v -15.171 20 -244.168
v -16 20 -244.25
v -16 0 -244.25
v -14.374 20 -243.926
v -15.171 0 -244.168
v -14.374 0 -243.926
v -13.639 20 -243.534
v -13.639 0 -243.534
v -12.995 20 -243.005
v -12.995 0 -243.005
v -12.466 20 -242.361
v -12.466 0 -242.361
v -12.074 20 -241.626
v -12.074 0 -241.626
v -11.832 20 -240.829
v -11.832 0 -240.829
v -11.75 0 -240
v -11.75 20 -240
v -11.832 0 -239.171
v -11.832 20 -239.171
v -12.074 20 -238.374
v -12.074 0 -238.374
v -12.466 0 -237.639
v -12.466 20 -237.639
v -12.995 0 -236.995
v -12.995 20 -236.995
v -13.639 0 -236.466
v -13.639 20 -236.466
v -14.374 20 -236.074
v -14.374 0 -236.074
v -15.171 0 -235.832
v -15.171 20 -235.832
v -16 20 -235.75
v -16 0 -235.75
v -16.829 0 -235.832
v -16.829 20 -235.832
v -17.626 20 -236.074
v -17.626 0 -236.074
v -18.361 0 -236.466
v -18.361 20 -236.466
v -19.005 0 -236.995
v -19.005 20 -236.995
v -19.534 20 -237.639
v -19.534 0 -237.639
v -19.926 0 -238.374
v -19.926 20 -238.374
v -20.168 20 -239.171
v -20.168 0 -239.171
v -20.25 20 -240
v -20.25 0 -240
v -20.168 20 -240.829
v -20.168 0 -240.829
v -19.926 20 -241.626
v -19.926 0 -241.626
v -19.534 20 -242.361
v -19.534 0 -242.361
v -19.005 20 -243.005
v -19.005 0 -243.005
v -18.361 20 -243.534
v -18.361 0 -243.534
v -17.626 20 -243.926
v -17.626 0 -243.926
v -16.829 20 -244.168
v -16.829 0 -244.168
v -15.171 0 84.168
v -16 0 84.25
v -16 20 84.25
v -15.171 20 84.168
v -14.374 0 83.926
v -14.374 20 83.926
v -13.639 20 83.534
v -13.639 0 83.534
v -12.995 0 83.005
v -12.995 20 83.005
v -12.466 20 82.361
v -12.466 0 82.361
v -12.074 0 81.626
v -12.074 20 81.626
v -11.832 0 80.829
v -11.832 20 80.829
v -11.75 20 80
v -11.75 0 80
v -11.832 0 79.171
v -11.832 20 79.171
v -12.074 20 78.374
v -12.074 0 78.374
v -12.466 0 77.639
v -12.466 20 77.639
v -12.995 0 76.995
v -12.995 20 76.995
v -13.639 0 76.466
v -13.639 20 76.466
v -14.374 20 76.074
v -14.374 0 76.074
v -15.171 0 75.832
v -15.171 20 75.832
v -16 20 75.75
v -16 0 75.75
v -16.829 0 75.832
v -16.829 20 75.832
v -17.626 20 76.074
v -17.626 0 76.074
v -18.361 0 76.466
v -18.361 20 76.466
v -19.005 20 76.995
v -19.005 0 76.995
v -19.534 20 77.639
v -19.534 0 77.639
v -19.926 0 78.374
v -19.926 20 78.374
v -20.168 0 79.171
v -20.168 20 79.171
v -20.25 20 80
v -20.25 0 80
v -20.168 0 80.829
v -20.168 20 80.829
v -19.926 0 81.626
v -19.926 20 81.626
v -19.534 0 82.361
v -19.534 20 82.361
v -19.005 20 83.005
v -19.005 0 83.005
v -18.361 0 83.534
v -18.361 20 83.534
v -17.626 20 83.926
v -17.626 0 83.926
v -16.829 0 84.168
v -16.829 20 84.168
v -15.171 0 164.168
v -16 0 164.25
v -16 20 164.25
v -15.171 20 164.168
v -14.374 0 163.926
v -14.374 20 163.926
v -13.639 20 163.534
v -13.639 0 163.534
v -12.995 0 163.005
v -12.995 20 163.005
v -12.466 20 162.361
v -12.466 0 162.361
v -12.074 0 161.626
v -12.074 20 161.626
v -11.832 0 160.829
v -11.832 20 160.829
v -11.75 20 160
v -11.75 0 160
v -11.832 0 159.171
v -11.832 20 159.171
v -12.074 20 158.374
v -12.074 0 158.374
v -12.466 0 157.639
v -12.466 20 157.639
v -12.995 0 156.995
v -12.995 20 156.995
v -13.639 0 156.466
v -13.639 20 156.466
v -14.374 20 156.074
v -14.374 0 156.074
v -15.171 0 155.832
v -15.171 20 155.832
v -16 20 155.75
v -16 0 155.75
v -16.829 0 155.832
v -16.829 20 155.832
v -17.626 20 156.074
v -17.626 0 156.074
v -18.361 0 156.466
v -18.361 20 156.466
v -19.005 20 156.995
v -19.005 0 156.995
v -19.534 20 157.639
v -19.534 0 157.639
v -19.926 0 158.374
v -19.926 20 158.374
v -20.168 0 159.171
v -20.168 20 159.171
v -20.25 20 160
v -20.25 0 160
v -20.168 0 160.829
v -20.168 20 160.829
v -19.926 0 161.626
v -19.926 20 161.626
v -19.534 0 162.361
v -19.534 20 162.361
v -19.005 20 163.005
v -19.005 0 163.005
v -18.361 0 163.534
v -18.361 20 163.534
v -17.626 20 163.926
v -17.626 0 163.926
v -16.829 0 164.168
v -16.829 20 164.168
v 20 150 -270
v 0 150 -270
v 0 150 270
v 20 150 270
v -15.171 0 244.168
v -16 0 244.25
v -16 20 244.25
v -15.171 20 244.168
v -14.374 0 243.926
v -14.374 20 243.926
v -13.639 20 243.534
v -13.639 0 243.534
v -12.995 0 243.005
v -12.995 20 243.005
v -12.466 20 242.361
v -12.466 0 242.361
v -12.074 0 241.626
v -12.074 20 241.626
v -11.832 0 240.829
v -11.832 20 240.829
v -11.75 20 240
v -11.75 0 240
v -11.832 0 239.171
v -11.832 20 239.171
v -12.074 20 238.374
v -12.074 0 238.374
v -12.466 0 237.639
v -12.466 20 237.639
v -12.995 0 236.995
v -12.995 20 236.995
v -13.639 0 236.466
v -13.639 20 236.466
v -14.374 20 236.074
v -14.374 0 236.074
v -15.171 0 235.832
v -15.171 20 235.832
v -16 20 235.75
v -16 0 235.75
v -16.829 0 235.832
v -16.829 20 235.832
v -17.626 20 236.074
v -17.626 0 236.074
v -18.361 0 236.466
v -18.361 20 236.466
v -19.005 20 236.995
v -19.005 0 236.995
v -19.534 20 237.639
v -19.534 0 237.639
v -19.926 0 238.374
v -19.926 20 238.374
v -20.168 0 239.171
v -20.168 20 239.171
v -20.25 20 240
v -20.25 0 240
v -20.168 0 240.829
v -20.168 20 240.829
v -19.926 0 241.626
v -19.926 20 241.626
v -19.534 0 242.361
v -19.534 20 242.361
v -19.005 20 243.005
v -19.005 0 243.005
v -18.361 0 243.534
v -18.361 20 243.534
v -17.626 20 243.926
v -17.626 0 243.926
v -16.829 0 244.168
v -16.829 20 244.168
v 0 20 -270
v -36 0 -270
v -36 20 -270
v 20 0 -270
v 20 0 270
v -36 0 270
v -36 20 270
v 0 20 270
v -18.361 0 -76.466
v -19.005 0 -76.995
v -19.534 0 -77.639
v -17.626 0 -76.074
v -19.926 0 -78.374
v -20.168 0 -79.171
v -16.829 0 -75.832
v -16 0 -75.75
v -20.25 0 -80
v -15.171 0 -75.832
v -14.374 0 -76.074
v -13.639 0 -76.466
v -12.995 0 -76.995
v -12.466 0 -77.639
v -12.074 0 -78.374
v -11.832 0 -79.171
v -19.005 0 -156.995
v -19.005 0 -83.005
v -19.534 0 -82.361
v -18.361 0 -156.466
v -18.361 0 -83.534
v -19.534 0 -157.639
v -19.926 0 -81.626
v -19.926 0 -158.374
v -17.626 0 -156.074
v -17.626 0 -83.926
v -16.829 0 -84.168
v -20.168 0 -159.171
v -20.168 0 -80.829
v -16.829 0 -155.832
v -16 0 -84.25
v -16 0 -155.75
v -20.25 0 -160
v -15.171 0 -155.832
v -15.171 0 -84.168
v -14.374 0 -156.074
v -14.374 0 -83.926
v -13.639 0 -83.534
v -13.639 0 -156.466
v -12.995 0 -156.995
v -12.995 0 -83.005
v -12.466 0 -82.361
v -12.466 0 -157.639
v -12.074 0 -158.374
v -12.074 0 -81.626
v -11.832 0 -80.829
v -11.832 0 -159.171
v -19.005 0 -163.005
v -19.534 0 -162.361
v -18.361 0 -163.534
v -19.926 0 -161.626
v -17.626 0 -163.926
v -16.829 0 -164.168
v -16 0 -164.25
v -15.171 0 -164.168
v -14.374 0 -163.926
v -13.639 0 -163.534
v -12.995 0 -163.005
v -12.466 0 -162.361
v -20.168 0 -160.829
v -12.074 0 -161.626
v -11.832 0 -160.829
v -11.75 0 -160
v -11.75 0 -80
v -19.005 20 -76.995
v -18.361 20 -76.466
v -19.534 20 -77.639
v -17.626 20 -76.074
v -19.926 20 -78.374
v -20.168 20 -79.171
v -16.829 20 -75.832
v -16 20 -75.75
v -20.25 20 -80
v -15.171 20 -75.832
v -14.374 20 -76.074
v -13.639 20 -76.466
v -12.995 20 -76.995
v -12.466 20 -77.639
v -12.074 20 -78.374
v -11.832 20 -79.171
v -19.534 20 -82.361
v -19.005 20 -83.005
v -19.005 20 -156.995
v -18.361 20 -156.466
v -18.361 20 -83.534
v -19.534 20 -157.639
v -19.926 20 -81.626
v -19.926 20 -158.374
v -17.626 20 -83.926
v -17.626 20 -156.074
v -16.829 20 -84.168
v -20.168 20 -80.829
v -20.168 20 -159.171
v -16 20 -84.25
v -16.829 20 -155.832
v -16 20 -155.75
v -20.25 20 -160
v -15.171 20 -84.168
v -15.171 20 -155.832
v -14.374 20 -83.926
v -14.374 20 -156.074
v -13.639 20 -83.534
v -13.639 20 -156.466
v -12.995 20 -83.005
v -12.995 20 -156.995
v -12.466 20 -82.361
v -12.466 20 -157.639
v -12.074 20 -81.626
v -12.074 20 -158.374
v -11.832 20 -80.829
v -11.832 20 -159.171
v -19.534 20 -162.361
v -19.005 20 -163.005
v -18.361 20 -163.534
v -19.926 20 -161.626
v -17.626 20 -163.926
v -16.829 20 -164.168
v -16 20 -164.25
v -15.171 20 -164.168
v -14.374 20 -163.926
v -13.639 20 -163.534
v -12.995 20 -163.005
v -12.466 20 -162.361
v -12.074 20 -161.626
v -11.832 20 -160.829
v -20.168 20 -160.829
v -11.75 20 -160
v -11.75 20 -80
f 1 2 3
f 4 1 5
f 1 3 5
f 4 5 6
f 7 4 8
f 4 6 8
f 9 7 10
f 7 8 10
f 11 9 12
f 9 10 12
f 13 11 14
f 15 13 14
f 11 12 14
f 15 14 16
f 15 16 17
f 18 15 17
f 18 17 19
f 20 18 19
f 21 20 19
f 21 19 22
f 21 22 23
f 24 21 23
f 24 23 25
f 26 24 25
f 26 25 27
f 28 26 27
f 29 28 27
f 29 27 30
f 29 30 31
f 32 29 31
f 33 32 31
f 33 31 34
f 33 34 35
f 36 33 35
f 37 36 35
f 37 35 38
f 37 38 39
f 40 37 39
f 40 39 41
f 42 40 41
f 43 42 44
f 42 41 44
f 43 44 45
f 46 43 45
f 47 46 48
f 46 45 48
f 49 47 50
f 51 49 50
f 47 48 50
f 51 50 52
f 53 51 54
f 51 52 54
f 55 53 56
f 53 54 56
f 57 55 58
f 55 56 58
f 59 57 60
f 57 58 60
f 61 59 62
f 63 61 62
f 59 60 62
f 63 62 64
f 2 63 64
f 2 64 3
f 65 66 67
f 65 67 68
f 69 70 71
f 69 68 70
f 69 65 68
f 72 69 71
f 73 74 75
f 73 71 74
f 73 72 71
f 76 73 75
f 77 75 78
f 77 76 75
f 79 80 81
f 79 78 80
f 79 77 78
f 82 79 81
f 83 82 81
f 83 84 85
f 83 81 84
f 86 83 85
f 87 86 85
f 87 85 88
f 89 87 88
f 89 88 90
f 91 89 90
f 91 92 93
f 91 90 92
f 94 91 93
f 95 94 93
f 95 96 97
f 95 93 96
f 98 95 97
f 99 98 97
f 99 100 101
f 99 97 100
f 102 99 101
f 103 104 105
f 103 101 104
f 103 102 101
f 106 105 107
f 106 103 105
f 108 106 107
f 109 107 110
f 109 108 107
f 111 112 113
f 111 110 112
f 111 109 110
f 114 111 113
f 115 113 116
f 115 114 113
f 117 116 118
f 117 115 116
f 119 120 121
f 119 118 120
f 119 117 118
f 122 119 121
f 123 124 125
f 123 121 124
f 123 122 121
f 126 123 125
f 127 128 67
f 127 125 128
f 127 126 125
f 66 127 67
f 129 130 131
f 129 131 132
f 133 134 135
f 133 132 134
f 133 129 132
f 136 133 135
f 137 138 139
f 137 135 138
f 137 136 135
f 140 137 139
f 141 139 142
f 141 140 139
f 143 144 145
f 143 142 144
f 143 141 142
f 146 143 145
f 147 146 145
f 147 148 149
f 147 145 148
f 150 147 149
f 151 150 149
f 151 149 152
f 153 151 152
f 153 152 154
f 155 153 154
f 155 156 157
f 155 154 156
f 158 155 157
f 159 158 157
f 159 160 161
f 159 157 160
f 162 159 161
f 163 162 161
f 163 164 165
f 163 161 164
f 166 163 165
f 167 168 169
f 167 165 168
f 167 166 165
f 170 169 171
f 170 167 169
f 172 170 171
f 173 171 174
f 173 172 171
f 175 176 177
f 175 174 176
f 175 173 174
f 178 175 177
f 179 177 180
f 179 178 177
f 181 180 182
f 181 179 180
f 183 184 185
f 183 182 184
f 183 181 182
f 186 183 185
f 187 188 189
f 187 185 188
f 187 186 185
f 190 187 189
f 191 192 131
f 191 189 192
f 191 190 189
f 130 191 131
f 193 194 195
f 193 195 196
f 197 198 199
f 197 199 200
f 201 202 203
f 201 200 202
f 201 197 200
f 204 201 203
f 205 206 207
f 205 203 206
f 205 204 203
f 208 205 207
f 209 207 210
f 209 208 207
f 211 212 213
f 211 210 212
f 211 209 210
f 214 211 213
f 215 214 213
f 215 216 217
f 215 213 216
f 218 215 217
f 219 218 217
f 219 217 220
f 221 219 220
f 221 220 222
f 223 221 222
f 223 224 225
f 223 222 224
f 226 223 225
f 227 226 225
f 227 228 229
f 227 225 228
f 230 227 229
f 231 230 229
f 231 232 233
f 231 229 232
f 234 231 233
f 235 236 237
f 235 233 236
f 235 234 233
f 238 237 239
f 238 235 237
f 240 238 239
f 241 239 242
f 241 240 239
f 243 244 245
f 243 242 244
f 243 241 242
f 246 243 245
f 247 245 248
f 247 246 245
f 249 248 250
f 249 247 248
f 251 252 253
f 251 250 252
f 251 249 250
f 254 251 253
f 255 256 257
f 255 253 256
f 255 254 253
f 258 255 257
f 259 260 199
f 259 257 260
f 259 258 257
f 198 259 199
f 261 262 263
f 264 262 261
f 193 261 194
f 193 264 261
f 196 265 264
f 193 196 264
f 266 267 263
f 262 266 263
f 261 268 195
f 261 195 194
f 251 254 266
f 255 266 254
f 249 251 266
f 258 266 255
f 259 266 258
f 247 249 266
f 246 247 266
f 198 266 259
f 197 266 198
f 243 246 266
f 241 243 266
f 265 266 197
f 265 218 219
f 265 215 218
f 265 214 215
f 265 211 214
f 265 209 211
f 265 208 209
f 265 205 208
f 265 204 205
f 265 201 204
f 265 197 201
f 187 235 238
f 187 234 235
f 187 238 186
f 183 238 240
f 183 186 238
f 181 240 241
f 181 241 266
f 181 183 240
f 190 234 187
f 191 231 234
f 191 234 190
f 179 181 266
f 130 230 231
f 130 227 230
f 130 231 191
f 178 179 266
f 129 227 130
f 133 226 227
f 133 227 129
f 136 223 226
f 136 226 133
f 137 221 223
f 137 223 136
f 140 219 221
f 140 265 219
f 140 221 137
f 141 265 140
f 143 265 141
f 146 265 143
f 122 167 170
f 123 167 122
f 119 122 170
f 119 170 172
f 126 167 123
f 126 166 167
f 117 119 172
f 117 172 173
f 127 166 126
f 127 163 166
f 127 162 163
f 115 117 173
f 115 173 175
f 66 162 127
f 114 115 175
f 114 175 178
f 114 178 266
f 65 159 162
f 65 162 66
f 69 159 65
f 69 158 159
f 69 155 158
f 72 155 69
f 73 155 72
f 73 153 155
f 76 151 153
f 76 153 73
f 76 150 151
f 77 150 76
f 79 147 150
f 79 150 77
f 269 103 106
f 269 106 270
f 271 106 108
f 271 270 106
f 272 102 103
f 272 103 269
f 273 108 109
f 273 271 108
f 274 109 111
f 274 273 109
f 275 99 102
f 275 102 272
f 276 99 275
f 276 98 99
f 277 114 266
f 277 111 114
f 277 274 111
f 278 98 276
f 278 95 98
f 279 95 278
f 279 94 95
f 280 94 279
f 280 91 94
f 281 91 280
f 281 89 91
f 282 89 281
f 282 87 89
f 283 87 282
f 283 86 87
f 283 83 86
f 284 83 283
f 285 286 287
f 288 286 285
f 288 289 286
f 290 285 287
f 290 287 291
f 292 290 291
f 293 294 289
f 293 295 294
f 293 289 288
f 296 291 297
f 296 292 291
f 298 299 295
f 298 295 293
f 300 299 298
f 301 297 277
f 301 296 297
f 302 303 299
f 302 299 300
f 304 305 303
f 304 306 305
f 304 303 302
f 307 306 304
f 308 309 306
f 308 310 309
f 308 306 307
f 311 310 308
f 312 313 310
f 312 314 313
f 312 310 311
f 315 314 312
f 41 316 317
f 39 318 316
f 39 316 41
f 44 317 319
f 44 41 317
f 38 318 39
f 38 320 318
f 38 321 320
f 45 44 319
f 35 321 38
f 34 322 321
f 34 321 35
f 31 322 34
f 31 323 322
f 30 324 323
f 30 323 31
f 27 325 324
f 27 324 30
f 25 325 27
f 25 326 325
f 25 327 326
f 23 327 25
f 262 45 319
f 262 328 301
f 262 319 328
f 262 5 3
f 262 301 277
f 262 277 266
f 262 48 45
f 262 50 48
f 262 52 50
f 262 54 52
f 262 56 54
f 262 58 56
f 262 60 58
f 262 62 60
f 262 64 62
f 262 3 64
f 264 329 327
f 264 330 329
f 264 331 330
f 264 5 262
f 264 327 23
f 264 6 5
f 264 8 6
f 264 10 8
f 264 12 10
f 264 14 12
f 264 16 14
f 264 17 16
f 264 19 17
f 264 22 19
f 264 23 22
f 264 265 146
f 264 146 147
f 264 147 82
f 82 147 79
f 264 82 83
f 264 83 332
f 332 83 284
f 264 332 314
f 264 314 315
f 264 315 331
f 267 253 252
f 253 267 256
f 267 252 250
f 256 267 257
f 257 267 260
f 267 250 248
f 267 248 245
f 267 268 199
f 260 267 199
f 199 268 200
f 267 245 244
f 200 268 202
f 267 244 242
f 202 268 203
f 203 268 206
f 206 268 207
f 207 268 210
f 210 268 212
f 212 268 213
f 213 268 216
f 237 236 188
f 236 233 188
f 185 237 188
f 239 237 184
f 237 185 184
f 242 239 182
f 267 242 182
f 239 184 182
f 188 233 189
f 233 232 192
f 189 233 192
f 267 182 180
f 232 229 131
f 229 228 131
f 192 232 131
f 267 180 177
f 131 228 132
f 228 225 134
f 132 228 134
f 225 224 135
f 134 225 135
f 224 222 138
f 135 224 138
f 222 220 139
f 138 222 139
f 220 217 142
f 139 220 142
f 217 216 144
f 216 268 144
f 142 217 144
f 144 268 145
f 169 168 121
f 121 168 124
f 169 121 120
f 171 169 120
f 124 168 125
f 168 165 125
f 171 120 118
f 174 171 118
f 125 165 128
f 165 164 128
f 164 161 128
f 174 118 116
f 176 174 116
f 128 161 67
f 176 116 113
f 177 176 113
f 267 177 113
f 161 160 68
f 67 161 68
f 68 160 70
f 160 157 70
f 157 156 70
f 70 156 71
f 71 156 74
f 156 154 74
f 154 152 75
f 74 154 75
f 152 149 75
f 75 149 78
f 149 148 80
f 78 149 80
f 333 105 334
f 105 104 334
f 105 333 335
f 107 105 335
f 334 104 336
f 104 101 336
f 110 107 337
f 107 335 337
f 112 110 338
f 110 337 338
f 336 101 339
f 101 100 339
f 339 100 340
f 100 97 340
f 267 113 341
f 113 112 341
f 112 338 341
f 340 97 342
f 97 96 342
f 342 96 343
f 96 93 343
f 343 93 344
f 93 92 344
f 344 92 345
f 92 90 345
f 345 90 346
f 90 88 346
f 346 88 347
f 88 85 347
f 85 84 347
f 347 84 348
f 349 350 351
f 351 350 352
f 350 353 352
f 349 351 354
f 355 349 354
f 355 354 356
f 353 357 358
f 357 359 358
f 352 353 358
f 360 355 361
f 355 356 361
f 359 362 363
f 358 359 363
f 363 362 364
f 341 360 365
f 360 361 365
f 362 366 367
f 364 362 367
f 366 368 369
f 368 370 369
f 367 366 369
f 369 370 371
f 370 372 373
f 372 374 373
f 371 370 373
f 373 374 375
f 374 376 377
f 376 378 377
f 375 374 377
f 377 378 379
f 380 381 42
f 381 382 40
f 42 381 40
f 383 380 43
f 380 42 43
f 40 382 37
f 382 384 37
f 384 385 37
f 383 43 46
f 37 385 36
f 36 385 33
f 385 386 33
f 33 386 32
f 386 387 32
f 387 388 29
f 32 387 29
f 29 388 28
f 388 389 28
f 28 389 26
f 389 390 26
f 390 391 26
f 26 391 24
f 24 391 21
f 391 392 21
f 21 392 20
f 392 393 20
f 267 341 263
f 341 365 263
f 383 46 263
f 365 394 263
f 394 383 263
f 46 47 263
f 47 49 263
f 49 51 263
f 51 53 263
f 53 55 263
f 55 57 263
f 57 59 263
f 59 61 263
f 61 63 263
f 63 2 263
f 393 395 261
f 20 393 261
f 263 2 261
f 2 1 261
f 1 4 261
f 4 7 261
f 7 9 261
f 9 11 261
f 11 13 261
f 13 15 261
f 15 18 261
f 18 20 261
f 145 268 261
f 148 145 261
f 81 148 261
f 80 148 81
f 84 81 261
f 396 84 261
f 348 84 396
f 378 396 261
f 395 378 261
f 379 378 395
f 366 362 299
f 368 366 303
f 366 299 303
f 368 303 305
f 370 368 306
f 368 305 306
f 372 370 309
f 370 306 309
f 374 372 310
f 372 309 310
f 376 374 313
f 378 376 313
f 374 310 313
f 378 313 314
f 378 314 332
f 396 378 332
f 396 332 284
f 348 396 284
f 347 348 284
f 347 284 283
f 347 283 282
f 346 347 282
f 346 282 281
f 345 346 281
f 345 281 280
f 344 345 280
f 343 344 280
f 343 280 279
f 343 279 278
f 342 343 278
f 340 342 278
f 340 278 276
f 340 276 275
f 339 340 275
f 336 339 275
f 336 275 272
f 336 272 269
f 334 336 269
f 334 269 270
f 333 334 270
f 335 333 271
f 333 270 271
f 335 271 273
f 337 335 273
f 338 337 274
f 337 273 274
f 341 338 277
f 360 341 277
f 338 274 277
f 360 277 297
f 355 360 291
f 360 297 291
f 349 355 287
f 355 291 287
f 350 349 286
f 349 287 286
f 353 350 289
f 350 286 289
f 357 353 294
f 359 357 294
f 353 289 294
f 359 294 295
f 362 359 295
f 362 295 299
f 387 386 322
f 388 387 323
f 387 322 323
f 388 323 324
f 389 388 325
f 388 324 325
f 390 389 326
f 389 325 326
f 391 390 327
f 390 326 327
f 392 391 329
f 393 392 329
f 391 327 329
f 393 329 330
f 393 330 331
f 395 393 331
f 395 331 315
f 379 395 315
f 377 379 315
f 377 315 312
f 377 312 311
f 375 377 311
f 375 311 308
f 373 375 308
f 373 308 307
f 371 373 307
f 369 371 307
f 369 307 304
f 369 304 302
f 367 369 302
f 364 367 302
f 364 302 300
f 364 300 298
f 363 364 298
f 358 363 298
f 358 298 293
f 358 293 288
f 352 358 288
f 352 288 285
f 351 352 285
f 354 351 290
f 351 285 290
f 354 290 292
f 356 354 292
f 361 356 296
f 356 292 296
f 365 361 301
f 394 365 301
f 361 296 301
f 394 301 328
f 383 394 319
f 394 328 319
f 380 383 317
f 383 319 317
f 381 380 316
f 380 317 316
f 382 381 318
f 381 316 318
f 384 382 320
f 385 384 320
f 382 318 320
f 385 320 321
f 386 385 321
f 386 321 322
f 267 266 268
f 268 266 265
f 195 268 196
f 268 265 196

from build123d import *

# Parameters (mm, degrees)
SKETCH1_W           = 20
SKETCH1_H           = 540
BOSS_EXTRUDE1_DEPTH = 150
SKETCH2_W           = 540
SKETCH2_H           = 20
BOSS_EXTRUDE2_DEPTH = 36
M10_TAPPED_HOLE1_D  = 8.5


with BuildPart() as part:
    # Sketch1 → Boss-Extrude1 (new body)
    with BuildSketch(Plane(origin=(0, 0, 0), x_dir=(1, 0, 0), z_dir=(0, 1, 0))):
        with Locations((10, 0)):
            Rectangle(SKETCH1_W, SKETCH1_H)
    extrude(amount=BOSS_EXTRUDE1_DEPTH)

    # Sketch2 → Boss-Extrude2 (add)
    with BuildSketch(Plane(origin=(0, 0, 0), x_dir=(0, 0, -1), z_dir=(1, 0, 0))):
        with Locations((0, 10)):
            Rectangle(SKETCH2_W, SKETCH2_H)
    extrude(amount=-BOSS_EXTRUDE2_DEPTH)

    # M10 Tapped Hole1 (through all)
    with Locations(Plane(origin=(-16, 150, -240), x_dir=(0, 0, 1), z_dir=(0, 1, 0))):
        with Locations((0, 0), (80, 0), (160, 0)):
            m10_tapped_hole1 = Hole(M10_TAPPED_HOLE1_D / 2)

    # Mirror1: M10 Tapped Hole1 across plane
    add(m10_tapped_hole1.mirror(Plane.XY), mode=Mode.SUBTRACT)


solid = part.part
